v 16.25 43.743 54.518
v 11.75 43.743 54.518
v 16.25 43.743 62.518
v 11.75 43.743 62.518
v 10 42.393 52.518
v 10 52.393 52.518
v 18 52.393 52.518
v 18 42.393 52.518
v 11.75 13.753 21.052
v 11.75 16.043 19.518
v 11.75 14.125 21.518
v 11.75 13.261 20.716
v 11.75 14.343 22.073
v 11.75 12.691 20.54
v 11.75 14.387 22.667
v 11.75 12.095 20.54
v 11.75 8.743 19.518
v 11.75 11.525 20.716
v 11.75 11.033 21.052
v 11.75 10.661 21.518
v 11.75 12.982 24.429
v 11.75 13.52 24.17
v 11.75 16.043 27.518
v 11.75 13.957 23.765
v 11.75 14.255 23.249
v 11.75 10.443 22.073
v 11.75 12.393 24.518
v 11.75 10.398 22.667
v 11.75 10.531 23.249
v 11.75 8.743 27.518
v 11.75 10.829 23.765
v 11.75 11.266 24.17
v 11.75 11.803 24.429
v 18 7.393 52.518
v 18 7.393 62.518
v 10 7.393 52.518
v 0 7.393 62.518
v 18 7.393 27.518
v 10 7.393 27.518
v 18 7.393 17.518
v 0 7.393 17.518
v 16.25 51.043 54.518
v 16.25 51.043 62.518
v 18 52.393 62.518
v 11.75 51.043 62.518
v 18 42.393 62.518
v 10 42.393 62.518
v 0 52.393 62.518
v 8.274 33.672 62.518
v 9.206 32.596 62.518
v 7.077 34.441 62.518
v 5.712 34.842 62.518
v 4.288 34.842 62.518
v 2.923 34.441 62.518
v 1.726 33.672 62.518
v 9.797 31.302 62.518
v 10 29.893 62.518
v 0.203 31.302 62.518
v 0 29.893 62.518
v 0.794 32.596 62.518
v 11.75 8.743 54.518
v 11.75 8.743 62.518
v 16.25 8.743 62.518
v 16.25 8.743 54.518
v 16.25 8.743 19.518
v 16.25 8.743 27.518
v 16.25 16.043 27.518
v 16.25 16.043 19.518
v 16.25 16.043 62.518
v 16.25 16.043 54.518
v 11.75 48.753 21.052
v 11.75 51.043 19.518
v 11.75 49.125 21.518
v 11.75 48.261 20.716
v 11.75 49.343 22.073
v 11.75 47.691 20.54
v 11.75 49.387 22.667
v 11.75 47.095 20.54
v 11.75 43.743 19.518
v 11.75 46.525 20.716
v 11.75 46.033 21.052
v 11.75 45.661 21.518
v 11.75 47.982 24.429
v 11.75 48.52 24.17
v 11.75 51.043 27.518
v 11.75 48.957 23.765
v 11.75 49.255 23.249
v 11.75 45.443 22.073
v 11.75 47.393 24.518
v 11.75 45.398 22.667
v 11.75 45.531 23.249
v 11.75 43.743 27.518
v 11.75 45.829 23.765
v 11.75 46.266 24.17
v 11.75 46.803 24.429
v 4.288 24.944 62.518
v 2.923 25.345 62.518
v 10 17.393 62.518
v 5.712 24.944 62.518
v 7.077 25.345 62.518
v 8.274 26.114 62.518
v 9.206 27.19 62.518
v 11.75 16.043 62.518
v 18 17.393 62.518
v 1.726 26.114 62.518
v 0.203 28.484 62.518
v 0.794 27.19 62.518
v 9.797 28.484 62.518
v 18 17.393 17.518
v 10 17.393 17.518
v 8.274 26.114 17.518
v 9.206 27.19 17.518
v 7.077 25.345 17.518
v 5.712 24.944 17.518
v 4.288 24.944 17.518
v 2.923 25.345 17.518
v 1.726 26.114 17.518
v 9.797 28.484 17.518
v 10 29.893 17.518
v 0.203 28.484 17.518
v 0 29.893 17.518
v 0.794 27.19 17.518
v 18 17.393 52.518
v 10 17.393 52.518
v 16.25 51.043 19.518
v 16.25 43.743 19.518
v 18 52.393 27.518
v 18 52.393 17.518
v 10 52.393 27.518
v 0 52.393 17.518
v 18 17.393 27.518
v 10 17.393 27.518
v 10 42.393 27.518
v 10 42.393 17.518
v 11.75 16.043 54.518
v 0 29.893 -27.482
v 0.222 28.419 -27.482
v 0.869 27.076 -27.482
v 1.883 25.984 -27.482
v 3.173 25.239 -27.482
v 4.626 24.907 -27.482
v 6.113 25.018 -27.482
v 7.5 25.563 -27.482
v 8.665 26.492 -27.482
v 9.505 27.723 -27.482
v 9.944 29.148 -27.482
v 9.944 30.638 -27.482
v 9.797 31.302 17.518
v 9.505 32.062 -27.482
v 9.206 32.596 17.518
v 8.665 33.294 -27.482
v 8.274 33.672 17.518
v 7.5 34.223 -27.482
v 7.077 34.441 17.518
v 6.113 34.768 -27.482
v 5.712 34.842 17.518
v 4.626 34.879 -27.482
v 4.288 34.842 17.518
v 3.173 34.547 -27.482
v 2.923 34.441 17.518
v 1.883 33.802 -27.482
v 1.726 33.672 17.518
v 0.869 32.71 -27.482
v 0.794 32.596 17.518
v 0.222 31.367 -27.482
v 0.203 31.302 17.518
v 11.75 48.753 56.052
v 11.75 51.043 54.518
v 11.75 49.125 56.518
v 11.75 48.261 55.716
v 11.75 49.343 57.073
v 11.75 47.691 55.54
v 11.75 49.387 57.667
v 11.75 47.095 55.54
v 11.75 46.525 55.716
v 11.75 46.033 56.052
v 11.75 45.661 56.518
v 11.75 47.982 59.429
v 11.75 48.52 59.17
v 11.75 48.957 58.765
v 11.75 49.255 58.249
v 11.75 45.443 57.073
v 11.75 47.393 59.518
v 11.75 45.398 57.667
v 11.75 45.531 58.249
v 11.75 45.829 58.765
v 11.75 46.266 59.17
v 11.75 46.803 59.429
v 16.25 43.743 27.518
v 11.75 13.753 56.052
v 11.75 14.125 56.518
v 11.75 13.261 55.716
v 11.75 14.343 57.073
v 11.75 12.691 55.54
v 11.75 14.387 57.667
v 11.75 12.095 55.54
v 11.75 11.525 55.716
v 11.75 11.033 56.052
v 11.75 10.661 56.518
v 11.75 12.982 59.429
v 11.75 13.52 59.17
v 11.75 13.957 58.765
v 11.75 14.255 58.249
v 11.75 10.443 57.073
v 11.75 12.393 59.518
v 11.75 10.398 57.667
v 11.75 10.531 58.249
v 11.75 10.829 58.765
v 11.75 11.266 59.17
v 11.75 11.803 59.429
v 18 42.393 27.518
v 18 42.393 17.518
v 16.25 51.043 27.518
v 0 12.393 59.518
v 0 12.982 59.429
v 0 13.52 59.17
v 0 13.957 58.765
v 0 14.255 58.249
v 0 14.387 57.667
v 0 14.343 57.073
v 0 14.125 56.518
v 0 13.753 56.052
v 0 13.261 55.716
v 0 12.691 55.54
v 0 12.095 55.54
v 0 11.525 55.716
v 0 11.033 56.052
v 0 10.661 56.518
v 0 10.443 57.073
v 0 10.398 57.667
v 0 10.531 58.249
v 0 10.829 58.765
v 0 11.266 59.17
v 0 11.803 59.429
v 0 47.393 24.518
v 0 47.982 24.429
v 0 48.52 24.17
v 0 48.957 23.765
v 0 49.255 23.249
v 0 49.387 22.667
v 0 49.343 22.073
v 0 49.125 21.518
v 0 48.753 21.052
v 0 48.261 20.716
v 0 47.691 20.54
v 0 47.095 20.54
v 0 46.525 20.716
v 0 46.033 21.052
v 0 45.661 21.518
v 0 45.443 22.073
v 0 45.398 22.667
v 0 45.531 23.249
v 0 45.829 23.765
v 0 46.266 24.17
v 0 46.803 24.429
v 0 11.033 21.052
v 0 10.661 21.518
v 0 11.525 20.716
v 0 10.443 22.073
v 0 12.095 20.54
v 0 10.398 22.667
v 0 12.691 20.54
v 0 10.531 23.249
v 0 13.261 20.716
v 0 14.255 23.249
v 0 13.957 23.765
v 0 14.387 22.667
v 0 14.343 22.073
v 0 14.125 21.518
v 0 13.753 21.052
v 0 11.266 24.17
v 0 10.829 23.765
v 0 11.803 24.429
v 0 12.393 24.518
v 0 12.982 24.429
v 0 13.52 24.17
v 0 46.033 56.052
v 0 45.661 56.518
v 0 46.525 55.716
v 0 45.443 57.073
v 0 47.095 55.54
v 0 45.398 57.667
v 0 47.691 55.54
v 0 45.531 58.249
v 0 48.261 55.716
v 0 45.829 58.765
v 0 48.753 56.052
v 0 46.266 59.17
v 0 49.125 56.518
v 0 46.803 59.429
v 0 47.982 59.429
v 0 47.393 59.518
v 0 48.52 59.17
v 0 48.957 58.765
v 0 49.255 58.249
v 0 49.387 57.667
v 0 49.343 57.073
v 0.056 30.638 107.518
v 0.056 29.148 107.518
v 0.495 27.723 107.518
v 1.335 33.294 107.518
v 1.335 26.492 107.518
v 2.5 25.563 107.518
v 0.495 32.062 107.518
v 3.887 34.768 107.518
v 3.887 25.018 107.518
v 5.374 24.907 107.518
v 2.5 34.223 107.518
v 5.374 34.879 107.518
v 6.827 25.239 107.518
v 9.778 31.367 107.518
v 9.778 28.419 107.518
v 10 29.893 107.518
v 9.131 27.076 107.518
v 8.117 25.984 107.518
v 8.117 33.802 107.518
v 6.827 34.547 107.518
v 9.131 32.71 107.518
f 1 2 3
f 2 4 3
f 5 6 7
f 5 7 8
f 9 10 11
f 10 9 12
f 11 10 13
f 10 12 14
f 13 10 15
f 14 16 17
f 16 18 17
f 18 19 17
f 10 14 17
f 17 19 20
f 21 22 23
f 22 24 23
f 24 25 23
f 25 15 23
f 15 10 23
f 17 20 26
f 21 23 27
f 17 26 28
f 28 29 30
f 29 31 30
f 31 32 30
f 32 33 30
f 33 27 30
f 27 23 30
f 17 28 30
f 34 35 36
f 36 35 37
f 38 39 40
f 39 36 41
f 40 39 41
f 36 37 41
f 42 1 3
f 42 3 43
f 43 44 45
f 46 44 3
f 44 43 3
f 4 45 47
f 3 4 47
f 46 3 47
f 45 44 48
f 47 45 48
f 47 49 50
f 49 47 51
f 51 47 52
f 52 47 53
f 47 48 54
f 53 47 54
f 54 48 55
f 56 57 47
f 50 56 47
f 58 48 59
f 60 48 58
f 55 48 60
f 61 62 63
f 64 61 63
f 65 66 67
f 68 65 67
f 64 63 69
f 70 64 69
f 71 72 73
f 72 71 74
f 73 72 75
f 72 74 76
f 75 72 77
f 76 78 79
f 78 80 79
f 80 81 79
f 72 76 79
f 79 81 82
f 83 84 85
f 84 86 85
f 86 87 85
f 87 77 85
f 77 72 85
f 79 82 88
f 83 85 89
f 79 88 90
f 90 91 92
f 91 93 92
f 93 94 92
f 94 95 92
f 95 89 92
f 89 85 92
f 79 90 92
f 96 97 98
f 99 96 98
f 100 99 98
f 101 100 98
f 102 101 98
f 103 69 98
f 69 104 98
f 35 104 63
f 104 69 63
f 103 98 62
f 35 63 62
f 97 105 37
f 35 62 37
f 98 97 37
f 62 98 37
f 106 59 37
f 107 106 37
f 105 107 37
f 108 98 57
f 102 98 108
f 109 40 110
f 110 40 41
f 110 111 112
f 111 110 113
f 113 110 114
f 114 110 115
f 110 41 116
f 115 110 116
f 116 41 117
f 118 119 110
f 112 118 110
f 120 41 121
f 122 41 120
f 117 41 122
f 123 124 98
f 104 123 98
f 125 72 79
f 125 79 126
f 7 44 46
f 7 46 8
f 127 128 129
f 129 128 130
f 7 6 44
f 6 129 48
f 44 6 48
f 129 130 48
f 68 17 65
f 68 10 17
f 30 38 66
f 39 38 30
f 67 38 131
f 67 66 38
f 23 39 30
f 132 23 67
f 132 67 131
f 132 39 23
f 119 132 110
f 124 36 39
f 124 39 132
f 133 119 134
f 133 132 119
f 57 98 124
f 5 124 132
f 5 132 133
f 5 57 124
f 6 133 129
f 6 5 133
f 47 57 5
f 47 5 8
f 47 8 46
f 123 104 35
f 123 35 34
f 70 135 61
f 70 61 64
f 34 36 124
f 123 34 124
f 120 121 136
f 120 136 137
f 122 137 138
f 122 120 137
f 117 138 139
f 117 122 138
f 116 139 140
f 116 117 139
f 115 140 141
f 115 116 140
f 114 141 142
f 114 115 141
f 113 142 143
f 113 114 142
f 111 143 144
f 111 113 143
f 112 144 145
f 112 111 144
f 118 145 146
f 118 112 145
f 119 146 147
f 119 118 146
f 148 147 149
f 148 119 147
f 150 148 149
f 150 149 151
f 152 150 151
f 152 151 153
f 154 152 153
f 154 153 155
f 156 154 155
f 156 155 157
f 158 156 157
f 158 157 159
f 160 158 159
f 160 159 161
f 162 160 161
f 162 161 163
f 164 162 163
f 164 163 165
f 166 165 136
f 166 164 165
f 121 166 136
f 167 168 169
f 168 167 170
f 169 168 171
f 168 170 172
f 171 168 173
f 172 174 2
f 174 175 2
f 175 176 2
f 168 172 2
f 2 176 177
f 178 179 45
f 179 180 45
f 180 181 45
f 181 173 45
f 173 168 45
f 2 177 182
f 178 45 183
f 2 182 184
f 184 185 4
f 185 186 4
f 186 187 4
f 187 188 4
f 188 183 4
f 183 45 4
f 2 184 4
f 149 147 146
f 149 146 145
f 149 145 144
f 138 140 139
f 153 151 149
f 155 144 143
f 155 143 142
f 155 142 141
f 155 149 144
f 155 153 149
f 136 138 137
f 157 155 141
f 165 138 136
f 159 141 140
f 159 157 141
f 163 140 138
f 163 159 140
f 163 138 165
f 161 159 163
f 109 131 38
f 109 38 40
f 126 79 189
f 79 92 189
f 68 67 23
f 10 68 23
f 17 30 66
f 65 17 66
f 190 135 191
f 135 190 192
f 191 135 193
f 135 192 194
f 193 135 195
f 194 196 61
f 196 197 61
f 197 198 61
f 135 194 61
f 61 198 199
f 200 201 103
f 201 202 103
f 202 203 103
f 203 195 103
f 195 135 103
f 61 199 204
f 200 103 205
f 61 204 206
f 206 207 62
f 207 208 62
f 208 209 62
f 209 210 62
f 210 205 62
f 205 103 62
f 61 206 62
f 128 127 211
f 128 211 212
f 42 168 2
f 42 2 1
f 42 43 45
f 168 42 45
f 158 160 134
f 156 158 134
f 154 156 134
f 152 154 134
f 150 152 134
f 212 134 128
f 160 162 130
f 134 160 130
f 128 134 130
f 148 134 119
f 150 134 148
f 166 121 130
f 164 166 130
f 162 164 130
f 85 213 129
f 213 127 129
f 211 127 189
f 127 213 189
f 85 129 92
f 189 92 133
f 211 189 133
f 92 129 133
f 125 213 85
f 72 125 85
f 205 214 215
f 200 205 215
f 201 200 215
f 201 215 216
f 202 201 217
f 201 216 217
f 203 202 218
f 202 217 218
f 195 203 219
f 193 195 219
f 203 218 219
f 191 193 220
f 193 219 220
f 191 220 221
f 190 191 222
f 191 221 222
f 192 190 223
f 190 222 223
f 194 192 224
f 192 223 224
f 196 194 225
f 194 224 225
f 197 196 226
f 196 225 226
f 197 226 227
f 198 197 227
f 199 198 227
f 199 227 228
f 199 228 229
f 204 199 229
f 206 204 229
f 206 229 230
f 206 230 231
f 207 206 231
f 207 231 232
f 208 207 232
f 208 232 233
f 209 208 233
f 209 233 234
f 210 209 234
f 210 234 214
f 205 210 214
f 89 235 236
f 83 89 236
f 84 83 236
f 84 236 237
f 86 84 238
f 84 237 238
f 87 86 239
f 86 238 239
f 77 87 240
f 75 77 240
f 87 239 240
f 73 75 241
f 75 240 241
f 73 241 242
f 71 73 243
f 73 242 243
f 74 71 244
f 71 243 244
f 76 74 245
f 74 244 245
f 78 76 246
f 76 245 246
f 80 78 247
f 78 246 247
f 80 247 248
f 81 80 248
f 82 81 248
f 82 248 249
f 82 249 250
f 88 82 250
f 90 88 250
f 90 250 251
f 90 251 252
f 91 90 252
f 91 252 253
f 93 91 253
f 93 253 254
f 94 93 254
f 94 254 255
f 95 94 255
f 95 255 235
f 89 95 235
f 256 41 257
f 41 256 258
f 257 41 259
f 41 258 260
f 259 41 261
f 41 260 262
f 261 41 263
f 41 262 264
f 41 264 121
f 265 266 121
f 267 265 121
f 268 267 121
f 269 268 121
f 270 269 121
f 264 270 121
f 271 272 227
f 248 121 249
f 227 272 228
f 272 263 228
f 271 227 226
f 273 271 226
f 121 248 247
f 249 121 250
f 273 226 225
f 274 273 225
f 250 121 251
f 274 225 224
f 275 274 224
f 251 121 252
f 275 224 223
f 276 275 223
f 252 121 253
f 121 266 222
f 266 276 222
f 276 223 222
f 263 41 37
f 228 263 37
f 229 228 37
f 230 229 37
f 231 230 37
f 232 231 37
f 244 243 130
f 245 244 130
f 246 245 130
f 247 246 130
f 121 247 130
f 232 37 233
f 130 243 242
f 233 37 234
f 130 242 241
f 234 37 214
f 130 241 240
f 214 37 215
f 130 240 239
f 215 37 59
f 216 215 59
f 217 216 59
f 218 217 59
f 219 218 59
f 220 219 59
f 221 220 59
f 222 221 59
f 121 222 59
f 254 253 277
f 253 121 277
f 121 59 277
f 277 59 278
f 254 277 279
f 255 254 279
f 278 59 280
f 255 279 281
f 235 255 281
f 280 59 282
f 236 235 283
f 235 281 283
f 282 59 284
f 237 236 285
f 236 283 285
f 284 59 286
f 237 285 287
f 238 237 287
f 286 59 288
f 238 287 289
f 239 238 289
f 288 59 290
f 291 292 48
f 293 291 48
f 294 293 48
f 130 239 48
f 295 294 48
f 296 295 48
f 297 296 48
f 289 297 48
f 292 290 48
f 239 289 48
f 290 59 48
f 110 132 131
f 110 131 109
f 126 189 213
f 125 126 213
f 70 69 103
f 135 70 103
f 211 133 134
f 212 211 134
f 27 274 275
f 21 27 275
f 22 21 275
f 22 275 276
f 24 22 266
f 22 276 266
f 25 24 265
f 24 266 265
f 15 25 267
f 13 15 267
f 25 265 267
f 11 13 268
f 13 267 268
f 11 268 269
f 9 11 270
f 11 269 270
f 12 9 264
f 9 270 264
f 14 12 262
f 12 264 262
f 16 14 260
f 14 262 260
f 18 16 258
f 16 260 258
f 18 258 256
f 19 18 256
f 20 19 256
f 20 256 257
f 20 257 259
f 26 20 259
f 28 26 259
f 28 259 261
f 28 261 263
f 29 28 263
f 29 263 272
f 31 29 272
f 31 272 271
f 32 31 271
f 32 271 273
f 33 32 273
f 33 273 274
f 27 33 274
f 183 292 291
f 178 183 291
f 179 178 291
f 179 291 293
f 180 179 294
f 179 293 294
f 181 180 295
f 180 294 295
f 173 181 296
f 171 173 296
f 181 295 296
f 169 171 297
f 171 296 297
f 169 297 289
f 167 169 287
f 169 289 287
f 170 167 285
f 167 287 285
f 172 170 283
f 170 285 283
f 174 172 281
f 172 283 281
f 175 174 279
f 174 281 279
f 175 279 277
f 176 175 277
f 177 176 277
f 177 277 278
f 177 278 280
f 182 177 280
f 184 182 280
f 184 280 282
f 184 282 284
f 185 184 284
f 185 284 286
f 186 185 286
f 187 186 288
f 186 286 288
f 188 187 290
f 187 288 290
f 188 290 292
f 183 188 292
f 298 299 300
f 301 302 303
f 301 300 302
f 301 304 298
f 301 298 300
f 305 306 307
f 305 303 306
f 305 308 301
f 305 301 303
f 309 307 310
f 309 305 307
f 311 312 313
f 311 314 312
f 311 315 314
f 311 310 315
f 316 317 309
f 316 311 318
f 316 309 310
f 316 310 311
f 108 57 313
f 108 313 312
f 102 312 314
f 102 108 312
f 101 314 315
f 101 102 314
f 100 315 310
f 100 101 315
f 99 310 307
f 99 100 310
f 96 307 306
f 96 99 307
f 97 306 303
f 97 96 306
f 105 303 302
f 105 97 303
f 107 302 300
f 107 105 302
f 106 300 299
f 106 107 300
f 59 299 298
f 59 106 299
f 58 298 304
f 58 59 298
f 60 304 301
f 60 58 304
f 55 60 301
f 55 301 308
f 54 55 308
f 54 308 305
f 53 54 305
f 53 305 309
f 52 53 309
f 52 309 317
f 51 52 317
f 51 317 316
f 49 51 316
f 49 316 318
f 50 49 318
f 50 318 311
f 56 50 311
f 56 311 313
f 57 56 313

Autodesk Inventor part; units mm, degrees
ref_plane "YZ Plane" through (0, 0, 0) normal (1, 0, 0) x (0, 1, 0)
ref_plane "XZ Plane" through (0, 0, 0) normal (0, 1, 0) x (-1, 0, 0)
ref_plane "XY Plane" through (0, 0, 0) normal (0, 0, 1) x (1, 0, 0)
sketch "Skizze1" plane through (0, 0, 0) normal (1, 0, 0) x (0, 1, 0)
  line L0 (52.3929, 62.5179) -> (7.3929, 62.5179)
  line L1 (7.3929, 62.5179) -> (7.3929, 17.5179)
  line L2 (7.3929, 17.5179) -> (52.3929, 17.5179)
  line L3 (52.3929, 17.5179) -> (52.3929, 62.5179)
  point P0 (0, 0)
  dimension "d0" = 45
  dimension "d1" = 45
extrude "Extrusion1" add sketch "Skizze1" along normal blind 10
sketch "Skizze2" plane through (0, 7.3929, 62.5179) normal (0, 0, 1) x (1, 0, 0)
  line L0 (0, 0) -> (10, 0) projected
  line L1 (0, 45) -> (0, 0) projected
  line L2 (10, 45) -> (10, 0) projected
  circle A0 centre (5, 22.5) radius 5
  point P0 (0, -7.3929)
  dimension "d4" = 22.5
  dimension "d7" = 10
  dimension "d18" = 5
extrude "Extrusion2" add sketch "Skizze2" along normal blind 45 contours A0
sketch "Skizze3" plane through (0, 7.3929, 17.5179) normal (0, 0, -1) x (-1, 0, 0)
  line L0 (0, 45) -> (-10, 45) projected
  circle A0 centre (-5, 22.5) radius 5
  line L1 (0, 0) -> (0, 45) projected
  point P0 (0, -7.3929)
  dimension "d10" = 22.5
  dimension "d11" = 10
  dimension "d19" = 5
extrude "Extrusion3" add sketch "Skizze3" along normal blind 45
sketch "Skizze4" plane through (10, 0, 0) normal (1, 0, 0) x (0, 0, -1)
  point P0 (0, 0)
sketch "Skizze6" plane through (10, 52.3929, 59.5179) normal (1, 0, 0) x (0, 0, -1)
  point P0 (59.5179, -52.3929)
sketch "Skizze7" plane through (10, 52.3929, 59.5179) normal (1, 0, 0) x (0, 0, -1)
  point P0 (59.5179, -52.3929)
sketch "Skizze10" plane through (10, 0, 0) normal (1, 0, 0) x (0, 0, -1)
  line L0 (-62.5179, 29.8929) -> (-62.5179, 7.3929) projected
  line L1 (-62.5179, 52.3929) -> (-62.5179, 29.8929) projected
  line L2 (-17.5179, 52.3929) -> (-62.5179, 52.3929) projected
  line L3 (-17.5179, 29.8929) -> (-17.5179, 52.3929) projected
  line L4 (-17.5179, 24.8929) -> (27.4821, 24.8929) projected
  line L5 (-17.5179, 7.3929) -> (-17.5179, 29.8929) projected
  line L6 (-62.5179, 7.3929) -> (-17.5179, 7.3929) projected
  line L7 (-62.5179, 7.3929) -> (-52.5179, 7.3929)
  line L8 (-52.5179, 7.3929) -> (-52.5179, 17.3929)
  line L9 (-52.5179, 17.3929) -> (-62.5179, 17.3929)
  line L10 (-62.5179, 17.3929) -> (-62.5179, 7.3929)
  line L11 (-62.5179, 52.3929) -> (-52.5179, 52.3929)
  line L12 (-52.5179, 52.3929) -> (-52.5179, 42.3929)
  line L13 (-52.5179, 42.3929) -> (-62.5179, 42.3929)
  line L14 (-62.5179, 42.3929) -> (-62.5179, 52.3929)
  line L15 (-17.5179, 7.3929) -> (-17.5179, 29.8929) projected
  line L16 (-17.5179, 7.3929) -> (-27.5179, 7.3929)
  line L17 (-27.5179, 7.3929) -> (-27.5179, 17.3929)
  line L18 (-27.5179, 17.3929) -> (-17.5179, 17.3929)
  line L19 (-17.5179, 17.3929) -> (-17.5179, 7.3929)
  line L20 (-17.5179, 52.3929) -> (-27.5179, 52.3929)
  line L21 (-27.5179, 52.3929) -> (-27.5179, 42.3929)
  line L22 (-27.5179, 42.3929) -> (-17.5179, 42.3929)
  line L23 (-17.5179, 42.3929) -> (-17.5179, 52.3929)
  point P0 (0, 0)
  dimension "d46" = 10
  dimension "d47" = 10
  dimension "d48" = 10
  dimension "d49" = 10
  dimension "d50" = 10
  dimension "d51" = 10
  dimension "d52" = 10
  dimension "d53" = 10
extrude "Extrusion5" add sketch "Skizze10" along normal blind 8 contours L9 L8 L6 L0 | L1 L2 L12 L13 | L17 L18 L5 L6 | L2 L3 L22 L21
sketch "Skizze11" plane through (0, 29.8929, 62.5179) normal (0, 0, 1) x (1, 0, 0)
  line L0 (11.75, 13.85) -> (16.25, 13.85)
  line L1 (16.25, 13.85) -> (16.25, 21.15)
  line L2 (16.25, 21.15) -> (11.75, 21.15)
  line L3 (11.75, 21.15) -> (11.75, 13.85)
  line L4 (11.75, -21.15) -> (16.25, -21.15)
  line L5 (16.25, -21.15) -> (16.25, -13.85)
  line L6 (16.25, -13.85) -> (11.75, -13.85)
  line L7 (11.75, -13.85) -> (11.75, -21.15)
  line L8 (0, -22.5) -> (18, -22.5) projected
  line L9 (10, 12.5) -> (18, 12.5) projected
  line L10 (18, 22.5) -> (18, 12.5) projected
  point P0 (0, -29.8929)
  dimension "d56" = 4.5
  dimension "d57" = 7.3
  dimension "d58" = 4.5
  dimension "d59" = 7.3
  dimension "d60" = 1.35
  dimension "d61" = 1.35
  dimension "d62" = 1.75
extrude "Extrusion6" cut sketch "Skizze11" against normal blind 8
sketch "Skizze12" plane through (10, 7.3929, 27.5179) normal (0, 0, 1) x (1, 0, 0)
  line L0 (1.75, 1.35) -> (6.25, 1.35)
  line L1 (6.25, 1.35) -> (6.25, 8.65)
  line L2 (6.25, 8.65) -> (1.75, 8.65)
  line L3 (1.75, 8.65) -> (1.75, 1.35)
  line L4 (1.75, 36.35) -> (6.25, 36.35)
  line L5 (6.25, 36.35) -> (6.25, 43.65)
  line L6 (6.25, 43.65) -> (1.75, 43.65)
  line L7 (1.75, 43.65) -> (1.75, 36.35)
  line L8 (8, 10) -> (8, 0) projected
  line L9 (0, 0) -> (8, 0) projected
  line L10 (0, 35) -> (8, 35) projected
  point P0 (-10, -7.3929)
  dimension "d65" = 1.75
  dimension "d66" = 1.35
  dimension "d67" = 7.3
  dimension "d68" = 4.5
  dimension "d69" = 7.3
  dimension "d70" = 4.5
  dimension "d71" = 1.35
extrude "Extrusion7" cut sketch "Skizze12" against normal blind 8
sketch "Skizze13" plane through (0, 0, 0) normal (-1, 0, 0) x (0, 0, 1)
  line L0 (62.5179, 52.3929) -> (62.5179, 29.8929) projected
  line L1 (17.5179, 52.3929) -> (62.5179, 52.3929) projected
  line L2 (62.5179, 29.8929) -> (62.5179, 7.3929) projected
  line L3 (62.5179, 7.3929) -> (17.5179, 7.3929) projected
  line L4 (17.5179, 7.3929) -> (17.5179, 29.8929) projected
  line L5 (17.5179, 29.8929) -> (17.5179, 52.3929) projected
  circle A0 centre (57.5179, 47.3929) radius 2
  circle A1 centre (57.5179, 12.3929) radius 2
  circle A2 centre (22.5179, 47.3929) radius 2
  circle A3 centre (22.5179, 12.3929) radius 2
  point P0 (0, 0)
  dimension "d74" = 5
  dimension "d75" = 5
  dimension "d76" = 5
  dimension "d77" = 5
  dimension "d78" = 5
  dimension "d79" = 5
  dimension "d80" = 5
  dimension "d81" = 5
  dimension "d82" = 4
  dimension "d83" = 4
  dimension "d84" = 4
  dimension "d85" = 4
extrude "Extrusion8" cut sketch "Skizze13" against normal blind 12 contours A0 | A1 | A2 | A3
sketch "Skizze14" plane through (0, 0, 0) normal (-1, 0, 0) x (0, 0, 1)
  point P0 (0, 0)
sketch "Skizze15" plane through (10, 0, 0) normal (1, 0, 0) x (0, 0, -1)
  point P0 (0, 0)
properties part number "Spiegelhalter2.0"
